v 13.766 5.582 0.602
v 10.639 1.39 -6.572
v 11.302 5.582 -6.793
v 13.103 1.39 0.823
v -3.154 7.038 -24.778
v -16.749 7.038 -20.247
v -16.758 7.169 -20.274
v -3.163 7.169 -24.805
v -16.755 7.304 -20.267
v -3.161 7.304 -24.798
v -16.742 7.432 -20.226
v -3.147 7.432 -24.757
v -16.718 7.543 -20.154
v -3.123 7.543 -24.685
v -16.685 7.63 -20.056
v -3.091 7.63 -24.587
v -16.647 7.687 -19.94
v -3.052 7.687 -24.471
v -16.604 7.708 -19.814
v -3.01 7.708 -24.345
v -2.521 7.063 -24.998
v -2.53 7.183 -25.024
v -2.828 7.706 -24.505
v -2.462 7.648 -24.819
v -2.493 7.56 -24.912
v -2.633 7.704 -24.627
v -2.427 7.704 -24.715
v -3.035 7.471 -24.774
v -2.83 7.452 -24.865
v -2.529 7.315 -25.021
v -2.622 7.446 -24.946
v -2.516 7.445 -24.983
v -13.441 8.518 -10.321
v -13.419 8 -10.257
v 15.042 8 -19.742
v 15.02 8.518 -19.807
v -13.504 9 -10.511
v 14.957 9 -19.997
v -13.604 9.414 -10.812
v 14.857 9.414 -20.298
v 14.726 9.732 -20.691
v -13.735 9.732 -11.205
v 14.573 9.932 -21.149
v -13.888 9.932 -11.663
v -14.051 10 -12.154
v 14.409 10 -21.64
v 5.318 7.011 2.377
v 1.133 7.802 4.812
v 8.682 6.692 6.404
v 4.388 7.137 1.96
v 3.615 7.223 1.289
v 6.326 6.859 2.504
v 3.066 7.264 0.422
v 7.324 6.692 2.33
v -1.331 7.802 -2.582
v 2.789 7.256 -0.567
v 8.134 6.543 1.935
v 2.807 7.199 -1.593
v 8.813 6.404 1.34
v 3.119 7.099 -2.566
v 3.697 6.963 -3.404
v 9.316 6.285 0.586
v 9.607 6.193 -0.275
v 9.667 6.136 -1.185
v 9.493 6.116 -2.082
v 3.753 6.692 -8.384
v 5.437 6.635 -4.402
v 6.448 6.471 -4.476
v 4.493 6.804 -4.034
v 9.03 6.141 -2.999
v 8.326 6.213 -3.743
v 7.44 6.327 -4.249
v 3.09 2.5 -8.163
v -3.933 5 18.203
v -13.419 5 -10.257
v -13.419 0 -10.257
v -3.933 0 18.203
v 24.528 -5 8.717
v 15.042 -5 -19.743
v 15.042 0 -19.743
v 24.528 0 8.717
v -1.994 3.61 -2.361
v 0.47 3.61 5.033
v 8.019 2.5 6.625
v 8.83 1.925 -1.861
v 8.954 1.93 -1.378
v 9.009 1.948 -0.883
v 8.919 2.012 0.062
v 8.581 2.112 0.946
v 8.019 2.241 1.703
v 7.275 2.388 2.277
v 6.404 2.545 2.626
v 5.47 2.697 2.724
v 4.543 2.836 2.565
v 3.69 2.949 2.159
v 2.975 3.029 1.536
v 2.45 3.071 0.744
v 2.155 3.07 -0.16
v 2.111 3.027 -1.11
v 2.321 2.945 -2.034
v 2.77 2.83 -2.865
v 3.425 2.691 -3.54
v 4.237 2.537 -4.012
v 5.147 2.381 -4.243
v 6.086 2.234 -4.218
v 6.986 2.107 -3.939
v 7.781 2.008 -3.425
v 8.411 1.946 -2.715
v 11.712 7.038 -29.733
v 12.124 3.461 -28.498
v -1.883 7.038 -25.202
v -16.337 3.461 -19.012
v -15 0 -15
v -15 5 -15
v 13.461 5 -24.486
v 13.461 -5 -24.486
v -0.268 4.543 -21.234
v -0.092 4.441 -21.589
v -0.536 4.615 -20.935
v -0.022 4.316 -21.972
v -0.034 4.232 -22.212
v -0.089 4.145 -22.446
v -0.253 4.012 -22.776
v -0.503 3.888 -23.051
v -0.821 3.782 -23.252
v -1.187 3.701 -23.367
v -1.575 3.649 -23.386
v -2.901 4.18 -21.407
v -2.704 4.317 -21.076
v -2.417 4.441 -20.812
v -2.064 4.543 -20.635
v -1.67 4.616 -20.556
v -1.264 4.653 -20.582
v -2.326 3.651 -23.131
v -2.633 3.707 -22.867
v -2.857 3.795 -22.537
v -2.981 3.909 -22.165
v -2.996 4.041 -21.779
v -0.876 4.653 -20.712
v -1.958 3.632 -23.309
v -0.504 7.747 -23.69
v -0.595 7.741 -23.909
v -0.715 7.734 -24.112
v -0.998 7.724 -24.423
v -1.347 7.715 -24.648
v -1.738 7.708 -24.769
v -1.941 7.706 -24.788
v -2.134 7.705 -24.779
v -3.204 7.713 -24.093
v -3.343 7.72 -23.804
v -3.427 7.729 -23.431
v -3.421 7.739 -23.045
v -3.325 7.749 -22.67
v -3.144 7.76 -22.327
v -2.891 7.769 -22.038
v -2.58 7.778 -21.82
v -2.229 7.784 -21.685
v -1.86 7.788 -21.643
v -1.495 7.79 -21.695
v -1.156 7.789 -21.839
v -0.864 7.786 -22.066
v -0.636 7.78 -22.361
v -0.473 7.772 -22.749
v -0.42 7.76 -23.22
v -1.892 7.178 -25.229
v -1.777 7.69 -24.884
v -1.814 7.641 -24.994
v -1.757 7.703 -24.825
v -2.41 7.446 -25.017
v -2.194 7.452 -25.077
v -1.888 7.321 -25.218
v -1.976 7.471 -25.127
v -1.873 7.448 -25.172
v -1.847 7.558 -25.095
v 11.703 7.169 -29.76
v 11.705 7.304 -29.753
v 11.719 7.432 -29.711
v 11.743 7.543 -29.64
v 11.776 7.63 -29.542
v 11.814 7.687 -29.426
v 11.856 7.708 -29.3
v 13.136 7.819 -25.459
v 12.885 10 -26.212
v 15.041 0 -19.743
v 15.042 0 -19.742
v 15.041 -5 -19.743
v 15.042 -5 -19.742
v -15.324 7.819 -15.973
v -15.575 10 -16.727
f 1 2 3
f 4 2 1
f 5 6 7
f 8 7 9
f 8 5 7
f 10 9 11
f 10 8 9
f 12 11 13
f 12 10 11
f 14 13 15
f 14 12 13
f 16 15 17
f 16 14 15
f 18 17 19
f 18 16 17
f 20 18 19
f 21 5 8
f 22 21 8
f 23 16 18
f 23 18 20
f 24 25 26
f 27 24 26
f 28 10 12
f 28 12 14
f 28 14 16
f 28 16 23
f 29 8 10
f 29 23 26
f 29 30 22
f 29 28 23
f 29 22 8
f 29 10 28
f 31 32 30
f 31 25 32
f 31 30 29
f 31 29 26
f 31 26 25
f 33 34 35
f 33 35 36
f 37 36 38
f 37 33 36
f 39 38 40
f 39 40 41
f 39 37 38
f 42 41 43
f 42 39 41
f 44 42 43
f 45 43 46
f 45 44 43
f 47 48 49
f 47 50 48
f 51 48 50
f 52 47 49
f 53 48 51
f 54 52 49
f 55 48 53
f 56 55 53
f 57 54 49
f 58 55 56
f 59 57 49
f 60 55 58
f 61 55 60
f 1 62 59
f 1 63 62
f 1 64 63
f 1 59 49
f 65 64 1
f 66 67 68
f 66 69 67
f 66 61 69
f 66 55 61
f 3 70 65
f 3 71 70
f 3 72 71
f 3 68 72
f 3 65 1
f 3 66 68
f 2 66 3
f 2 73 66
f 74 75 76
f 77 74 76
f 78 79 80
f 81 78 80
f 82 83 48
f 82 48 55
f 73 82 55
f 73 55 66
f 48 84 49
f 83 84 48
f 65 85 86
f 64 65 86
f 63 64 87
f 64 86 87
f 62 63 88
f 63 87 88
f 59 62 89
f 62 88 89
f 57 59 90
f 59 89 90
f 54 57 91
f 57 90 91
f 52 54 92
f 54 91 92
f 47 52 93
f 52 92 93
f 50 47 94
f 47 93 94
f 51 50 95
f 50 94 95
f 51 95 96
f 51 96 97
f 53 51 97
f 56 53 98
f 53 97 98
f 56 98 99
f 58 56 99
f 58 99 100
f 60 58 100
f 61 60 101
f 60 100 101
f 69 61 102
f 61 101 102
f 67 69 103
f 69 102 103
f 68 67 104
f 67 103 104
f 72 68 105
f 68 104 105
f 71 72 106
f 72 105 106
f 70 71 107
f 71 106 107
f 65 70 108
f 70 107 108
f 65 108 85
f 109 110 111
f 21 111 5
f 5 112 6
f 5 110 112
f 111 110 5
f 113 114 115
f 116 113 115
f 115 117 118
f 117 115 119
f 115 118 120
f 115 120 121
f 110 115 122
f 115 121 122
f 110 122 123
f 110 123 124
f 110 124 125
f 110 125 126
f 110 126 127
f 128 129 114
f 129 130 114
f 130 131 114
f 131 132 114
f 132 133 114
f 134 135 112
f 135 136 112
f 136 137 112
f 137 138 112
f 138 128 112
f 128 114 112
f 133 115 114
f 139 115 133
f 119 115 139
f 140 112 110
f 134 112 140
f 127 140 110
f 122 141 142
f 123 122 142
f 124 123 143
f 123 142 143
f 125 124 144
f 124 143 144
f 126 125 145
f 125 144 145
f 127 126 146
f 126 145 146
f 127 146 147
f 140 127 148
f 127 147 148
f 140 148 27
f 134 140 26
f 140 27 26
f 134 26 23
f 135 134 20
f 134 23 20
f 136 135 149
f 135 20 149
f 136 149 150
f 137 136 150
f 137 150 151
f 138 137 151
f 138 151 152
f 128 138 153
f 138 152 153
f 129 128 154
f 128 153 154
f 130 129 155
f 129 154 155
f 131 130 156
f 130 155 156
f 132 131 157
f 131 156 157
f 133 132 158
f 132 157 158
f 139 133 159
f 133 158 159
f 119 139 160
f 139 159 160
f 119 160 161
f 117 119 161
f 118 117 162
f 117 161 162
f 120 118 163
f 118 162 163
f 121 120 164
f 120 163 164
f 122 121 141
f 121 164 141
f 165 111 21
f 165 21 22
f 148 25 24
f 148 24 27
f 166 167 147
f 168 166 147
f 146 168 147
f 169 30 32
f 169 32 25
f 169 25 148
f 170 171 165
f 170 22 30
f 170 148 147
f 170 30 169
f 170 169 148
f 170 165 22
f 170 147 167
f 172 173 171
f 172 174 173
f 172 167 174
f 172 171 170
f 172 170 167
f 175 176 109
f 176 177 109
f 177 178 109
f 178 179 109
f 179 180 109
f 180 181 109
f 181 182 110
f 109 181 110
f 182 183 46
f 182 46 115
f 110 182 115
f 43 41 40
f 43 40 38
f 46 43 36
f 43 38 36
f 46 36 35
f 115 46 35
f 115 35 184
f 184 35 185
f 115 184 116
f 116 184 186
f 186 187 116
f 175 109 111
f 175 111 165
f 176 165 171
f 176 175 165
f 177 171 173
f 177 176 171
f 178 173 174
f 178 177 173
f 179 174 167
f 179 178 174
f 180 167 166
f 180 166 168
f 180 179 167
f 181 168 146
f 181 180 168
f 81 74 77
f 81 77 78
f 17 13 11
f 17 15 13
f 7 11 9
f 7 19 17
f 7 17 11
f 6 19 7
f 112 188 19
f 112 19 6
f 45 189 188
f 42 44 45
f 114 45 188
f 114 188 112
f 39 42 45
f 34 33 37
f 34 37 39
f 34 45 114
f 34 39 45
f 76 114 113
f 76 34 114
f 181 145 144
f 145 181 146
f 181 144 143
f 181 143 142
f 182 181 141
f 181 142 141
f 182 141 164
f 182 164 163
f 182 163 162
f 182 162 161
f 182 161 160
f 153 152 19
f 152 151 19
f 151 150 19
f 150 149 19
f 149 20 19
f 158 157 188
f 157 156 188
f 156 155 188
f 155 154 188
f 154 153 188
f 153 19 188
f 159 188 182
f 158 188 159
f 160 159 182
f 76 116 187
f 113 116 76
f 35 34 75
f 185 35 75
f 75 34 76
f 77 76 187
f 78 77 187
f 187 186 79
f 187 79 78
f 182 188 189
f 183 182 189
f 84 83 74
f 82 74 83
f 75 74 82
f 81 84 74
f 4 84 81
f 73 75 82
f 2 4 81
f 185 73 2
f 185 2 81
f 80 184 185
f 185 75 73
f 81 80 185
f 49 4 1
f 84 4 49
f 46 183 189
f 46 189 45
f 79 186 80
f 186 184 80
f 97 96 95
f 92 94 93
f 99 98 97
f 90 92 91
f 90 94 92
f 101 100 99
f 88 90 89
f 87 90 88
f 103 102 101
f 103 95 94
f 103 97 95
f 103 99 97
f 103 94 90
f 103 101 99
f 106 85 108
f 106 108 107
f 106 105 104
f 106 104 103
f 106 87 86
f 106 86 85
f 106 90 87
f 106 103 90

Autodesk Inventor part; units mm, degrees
ref_plane "YZ Plane" through (0, 0, 0) normal (1, 0, 0) x (0, 1, 0)
ref_plane "XZ Plane" through (0, 0, 0) normal (0, 1, 0) x (-1, 0, 0)
ref_plane "XY Plane" through (0, 0, 0) normal (0, 0, 1) x (1, 0, 0)
ref_plane "Work Plane2" through (-15, 5, -15) normal (-0.9487, 0, 0.3162) x (0, -1, 0)
sketch "Sketch3" plane through (-15, 5, -15) normal (-0.9487, 0, 0.3162) x (0, -1, 0)
  line L0 (0, 37.9473) -> (0, 0) projected
  line L1 (0, 0) -> (-5, 0)
  line L2 (-5, 0) -> (-5, 3)
  line L3 (-3, 5) -> (0, 5)
  line L4 (0, 0) -> (0, 5)
  arc A0 (-3, 5) -> (-5, 3) centre (-3, 3) ccw
  line L5 (0, 0) -> (5.0254, 0) construction
  line L6 (5, 0) -> (0, 0) projected
  line L7 (0, 0) -> (-5, -1.8199)
  line L8 (0, 0) -> (5.3209, 0) construction
  line L9 (-5, -1.8199) -> (-5, 0)
  line L10 (0, 0) -> (-3.2889, -1.1971)
  line L11 (0, 0) -> (-2.8191, -1.0261)
  line L12 (0, 0) -> (1.5391, -4.2286)
  line L13 (1.5391, -4.2286) -> (-2.6895, -5.7677)
  line L14 (-2.6895, -5.7677) -> (-2.8191, -1.0261)
  point P0 (5, 18.9737)
  point P1 (-5, 5)
  dimension "d5" = 5
  dimension "d6" = 5
  dimension "d7" = 2
  dimension "d9" = 160
  dimension "d12" = 3.5
  dimension "d20" = 3
  dimension "d21" = 4.5
extrude "Extrusion2" add sketch "Sketch3" against normal blind 30
ref_plane "Work Plane4" through (-16.8239, 7.6895, -20.4717) normal (0.1082, -0.9397, 0.3245) x (0.9487, 0, -0.3162)
sketch "Sketch5" plane through (-16.8239, 7.6895, -20.4717) normal (0.1082, -0.9397, 0.3245) x (0.9487, 0, -0.3162)
  line L0 (30, 4.5) -> (30, 0) projected
  line L1 (30, 0) -> (30, -0.5)
  line L2 (30, -0.5) -> (15, -0.5)
  line L3 (15, -0.5) -> (15, 2)
  circle A0 centre (15, 2) radius 1.5
  point P0 (9.4868, 20.6193)
  dimension "d24" = 0.5
  dimension "d25" = 15
  dimension "d26" = 2.5
  dimension "d27" = 3
extrude "Extrusion4" cut sketch "Sketch5" along normal blind 10
sketch "Sketch7" plane through (-15, 5, -15) normal (-0.9487, 0, 0.3162) x (0, -1, 0)
  line L0 (0, 0) -> (6.5506, 2.3842)
  line L1 (0, 0) -> (6.971, 0) construction
  line L2 (6.5506, 2.3842) -> (6.5506, -3.325)
  line L3 (6.5506, -3.325) -> (0, 0)
  point P0 (5, 18.9737)
  dimension "d34" = 20
extrude "Extrusion6" cut sketch "Sketch7" along normal blind 5 and the other way blind 40
fillet "Fillet2" radius 0.5 1 edges at (-2.5937, 7.6895, -25.2151)
sketch "Sketch8" plane through (-13.4189, 5, -10.2566) normal (0.3162, 0, 0.9487) x (0.9487, 0, -0.3162)
  line L0 (30, 0) -> (31.6228, 0) projected
  line L1 (30, 0) -> (36.1043, 0)
  line L2 (36.1043, 0) -> (36.1043, -10.0041)
  line L3 (36.1043, -10.0041) -> (30, -10.0041)
  line L4 (30, -10.0041) -> (30, 0)
  point P0 (9.4868, -5)
extrude "Extrusion7" cut sketch "Sketch8" along normal mid plane 20
ref_plane "Work Plane7" through (-15, 5, -15) normal (0.3162, 0, 0.9487) x (0.9487, 0, -0.3162)
sketch "Sketch10" plane through (-15, 5, -15) normal (0.3162, 0, 0.9487) x (0.9487, 0, -0.3162)
  line L0 (0, 0) -> (30, 0) projected
  line L1 (0, 0) -> (30, 0)
  line L2 (30, 0) -> (30, -5)
  line L3 (30, -5) -> (0, -5)
  line L4 (0, -5) -> (0, 0)
  line L5 (30, -5) -> (30, -10)
  line L6 (30, -10) -> (0, -5)
  point P0 (9.4868, -5)
  dimension "d49" = 30
  dimension "d50" = 5
  dimension "d51" = 5
extrude "Extrusion8" add sketch "Sketch10" along normal blind 5
sketch "Sketch11" plane through (15.0416, -5, -19.7434) normal (0.3162, 0, 0.9487) x (0.9487, 0, -0.3162)
  line L0 (-30, 10) -> (-30, 5) projected
  line L1 (-30, 5) -> (-30, 10)
  line L2 (-30, 10) -> (0, 5)
  line L3 (0, 0) -> (0, 10) projected
  line L4 (0, 0) -> (0, 5)
  line L5 (-30, 5) -> (0, 0) projected
  line L6 (0, 0) -> (-30, 5)
  point P0 (-20.5132, 5)
  dimension "d54" = 5
extrude "Extrusion9" add sketch "Sketch11" along normal blind 30
sketch "Sketch13" plane through (-13.4189, 5, -10.2566) normal (0.156, 0.9864, -0.052) x (0.9358, -0.1644, -0.3119)
  line L0 (30.4138, -30) -> (0, -30) projected
  line L1 (15.2069, -30) -> (15.2069, -15)
  circle A0 centre (15.2069, -15) radius 6.75
  line L2 (21.9569, -18.8971) -> (15.2069, -22.7942)
  line L3 (15.2069, -22.7942) -> (8.4569, -18.8971)
  line L4 (8.4569, -18.8971) -> (8.4569, -11.1029)
  line L5 (8.4569, -11.1029) -> (15.2069, -7.2058)
  line L6 (15.2069, -7.2058) -> (21.9569, -11.1029)
  line L7 (21.9569, -11.1029) -> (21.9569, -18.8971)
  circle A1 centre (15.2069, -15) radius 3.5
  point P0 (10.1797, -13.9737)
  point P1 (21.9569, -15)
  dimension "d58" = 13.5
  dimension "d57" = 15
  dimension "d59" = 7
extrude "Extrusion10" add sketch "Sketch13" along normal blind 4.25
properties part number "sem2_thumbmount2"
